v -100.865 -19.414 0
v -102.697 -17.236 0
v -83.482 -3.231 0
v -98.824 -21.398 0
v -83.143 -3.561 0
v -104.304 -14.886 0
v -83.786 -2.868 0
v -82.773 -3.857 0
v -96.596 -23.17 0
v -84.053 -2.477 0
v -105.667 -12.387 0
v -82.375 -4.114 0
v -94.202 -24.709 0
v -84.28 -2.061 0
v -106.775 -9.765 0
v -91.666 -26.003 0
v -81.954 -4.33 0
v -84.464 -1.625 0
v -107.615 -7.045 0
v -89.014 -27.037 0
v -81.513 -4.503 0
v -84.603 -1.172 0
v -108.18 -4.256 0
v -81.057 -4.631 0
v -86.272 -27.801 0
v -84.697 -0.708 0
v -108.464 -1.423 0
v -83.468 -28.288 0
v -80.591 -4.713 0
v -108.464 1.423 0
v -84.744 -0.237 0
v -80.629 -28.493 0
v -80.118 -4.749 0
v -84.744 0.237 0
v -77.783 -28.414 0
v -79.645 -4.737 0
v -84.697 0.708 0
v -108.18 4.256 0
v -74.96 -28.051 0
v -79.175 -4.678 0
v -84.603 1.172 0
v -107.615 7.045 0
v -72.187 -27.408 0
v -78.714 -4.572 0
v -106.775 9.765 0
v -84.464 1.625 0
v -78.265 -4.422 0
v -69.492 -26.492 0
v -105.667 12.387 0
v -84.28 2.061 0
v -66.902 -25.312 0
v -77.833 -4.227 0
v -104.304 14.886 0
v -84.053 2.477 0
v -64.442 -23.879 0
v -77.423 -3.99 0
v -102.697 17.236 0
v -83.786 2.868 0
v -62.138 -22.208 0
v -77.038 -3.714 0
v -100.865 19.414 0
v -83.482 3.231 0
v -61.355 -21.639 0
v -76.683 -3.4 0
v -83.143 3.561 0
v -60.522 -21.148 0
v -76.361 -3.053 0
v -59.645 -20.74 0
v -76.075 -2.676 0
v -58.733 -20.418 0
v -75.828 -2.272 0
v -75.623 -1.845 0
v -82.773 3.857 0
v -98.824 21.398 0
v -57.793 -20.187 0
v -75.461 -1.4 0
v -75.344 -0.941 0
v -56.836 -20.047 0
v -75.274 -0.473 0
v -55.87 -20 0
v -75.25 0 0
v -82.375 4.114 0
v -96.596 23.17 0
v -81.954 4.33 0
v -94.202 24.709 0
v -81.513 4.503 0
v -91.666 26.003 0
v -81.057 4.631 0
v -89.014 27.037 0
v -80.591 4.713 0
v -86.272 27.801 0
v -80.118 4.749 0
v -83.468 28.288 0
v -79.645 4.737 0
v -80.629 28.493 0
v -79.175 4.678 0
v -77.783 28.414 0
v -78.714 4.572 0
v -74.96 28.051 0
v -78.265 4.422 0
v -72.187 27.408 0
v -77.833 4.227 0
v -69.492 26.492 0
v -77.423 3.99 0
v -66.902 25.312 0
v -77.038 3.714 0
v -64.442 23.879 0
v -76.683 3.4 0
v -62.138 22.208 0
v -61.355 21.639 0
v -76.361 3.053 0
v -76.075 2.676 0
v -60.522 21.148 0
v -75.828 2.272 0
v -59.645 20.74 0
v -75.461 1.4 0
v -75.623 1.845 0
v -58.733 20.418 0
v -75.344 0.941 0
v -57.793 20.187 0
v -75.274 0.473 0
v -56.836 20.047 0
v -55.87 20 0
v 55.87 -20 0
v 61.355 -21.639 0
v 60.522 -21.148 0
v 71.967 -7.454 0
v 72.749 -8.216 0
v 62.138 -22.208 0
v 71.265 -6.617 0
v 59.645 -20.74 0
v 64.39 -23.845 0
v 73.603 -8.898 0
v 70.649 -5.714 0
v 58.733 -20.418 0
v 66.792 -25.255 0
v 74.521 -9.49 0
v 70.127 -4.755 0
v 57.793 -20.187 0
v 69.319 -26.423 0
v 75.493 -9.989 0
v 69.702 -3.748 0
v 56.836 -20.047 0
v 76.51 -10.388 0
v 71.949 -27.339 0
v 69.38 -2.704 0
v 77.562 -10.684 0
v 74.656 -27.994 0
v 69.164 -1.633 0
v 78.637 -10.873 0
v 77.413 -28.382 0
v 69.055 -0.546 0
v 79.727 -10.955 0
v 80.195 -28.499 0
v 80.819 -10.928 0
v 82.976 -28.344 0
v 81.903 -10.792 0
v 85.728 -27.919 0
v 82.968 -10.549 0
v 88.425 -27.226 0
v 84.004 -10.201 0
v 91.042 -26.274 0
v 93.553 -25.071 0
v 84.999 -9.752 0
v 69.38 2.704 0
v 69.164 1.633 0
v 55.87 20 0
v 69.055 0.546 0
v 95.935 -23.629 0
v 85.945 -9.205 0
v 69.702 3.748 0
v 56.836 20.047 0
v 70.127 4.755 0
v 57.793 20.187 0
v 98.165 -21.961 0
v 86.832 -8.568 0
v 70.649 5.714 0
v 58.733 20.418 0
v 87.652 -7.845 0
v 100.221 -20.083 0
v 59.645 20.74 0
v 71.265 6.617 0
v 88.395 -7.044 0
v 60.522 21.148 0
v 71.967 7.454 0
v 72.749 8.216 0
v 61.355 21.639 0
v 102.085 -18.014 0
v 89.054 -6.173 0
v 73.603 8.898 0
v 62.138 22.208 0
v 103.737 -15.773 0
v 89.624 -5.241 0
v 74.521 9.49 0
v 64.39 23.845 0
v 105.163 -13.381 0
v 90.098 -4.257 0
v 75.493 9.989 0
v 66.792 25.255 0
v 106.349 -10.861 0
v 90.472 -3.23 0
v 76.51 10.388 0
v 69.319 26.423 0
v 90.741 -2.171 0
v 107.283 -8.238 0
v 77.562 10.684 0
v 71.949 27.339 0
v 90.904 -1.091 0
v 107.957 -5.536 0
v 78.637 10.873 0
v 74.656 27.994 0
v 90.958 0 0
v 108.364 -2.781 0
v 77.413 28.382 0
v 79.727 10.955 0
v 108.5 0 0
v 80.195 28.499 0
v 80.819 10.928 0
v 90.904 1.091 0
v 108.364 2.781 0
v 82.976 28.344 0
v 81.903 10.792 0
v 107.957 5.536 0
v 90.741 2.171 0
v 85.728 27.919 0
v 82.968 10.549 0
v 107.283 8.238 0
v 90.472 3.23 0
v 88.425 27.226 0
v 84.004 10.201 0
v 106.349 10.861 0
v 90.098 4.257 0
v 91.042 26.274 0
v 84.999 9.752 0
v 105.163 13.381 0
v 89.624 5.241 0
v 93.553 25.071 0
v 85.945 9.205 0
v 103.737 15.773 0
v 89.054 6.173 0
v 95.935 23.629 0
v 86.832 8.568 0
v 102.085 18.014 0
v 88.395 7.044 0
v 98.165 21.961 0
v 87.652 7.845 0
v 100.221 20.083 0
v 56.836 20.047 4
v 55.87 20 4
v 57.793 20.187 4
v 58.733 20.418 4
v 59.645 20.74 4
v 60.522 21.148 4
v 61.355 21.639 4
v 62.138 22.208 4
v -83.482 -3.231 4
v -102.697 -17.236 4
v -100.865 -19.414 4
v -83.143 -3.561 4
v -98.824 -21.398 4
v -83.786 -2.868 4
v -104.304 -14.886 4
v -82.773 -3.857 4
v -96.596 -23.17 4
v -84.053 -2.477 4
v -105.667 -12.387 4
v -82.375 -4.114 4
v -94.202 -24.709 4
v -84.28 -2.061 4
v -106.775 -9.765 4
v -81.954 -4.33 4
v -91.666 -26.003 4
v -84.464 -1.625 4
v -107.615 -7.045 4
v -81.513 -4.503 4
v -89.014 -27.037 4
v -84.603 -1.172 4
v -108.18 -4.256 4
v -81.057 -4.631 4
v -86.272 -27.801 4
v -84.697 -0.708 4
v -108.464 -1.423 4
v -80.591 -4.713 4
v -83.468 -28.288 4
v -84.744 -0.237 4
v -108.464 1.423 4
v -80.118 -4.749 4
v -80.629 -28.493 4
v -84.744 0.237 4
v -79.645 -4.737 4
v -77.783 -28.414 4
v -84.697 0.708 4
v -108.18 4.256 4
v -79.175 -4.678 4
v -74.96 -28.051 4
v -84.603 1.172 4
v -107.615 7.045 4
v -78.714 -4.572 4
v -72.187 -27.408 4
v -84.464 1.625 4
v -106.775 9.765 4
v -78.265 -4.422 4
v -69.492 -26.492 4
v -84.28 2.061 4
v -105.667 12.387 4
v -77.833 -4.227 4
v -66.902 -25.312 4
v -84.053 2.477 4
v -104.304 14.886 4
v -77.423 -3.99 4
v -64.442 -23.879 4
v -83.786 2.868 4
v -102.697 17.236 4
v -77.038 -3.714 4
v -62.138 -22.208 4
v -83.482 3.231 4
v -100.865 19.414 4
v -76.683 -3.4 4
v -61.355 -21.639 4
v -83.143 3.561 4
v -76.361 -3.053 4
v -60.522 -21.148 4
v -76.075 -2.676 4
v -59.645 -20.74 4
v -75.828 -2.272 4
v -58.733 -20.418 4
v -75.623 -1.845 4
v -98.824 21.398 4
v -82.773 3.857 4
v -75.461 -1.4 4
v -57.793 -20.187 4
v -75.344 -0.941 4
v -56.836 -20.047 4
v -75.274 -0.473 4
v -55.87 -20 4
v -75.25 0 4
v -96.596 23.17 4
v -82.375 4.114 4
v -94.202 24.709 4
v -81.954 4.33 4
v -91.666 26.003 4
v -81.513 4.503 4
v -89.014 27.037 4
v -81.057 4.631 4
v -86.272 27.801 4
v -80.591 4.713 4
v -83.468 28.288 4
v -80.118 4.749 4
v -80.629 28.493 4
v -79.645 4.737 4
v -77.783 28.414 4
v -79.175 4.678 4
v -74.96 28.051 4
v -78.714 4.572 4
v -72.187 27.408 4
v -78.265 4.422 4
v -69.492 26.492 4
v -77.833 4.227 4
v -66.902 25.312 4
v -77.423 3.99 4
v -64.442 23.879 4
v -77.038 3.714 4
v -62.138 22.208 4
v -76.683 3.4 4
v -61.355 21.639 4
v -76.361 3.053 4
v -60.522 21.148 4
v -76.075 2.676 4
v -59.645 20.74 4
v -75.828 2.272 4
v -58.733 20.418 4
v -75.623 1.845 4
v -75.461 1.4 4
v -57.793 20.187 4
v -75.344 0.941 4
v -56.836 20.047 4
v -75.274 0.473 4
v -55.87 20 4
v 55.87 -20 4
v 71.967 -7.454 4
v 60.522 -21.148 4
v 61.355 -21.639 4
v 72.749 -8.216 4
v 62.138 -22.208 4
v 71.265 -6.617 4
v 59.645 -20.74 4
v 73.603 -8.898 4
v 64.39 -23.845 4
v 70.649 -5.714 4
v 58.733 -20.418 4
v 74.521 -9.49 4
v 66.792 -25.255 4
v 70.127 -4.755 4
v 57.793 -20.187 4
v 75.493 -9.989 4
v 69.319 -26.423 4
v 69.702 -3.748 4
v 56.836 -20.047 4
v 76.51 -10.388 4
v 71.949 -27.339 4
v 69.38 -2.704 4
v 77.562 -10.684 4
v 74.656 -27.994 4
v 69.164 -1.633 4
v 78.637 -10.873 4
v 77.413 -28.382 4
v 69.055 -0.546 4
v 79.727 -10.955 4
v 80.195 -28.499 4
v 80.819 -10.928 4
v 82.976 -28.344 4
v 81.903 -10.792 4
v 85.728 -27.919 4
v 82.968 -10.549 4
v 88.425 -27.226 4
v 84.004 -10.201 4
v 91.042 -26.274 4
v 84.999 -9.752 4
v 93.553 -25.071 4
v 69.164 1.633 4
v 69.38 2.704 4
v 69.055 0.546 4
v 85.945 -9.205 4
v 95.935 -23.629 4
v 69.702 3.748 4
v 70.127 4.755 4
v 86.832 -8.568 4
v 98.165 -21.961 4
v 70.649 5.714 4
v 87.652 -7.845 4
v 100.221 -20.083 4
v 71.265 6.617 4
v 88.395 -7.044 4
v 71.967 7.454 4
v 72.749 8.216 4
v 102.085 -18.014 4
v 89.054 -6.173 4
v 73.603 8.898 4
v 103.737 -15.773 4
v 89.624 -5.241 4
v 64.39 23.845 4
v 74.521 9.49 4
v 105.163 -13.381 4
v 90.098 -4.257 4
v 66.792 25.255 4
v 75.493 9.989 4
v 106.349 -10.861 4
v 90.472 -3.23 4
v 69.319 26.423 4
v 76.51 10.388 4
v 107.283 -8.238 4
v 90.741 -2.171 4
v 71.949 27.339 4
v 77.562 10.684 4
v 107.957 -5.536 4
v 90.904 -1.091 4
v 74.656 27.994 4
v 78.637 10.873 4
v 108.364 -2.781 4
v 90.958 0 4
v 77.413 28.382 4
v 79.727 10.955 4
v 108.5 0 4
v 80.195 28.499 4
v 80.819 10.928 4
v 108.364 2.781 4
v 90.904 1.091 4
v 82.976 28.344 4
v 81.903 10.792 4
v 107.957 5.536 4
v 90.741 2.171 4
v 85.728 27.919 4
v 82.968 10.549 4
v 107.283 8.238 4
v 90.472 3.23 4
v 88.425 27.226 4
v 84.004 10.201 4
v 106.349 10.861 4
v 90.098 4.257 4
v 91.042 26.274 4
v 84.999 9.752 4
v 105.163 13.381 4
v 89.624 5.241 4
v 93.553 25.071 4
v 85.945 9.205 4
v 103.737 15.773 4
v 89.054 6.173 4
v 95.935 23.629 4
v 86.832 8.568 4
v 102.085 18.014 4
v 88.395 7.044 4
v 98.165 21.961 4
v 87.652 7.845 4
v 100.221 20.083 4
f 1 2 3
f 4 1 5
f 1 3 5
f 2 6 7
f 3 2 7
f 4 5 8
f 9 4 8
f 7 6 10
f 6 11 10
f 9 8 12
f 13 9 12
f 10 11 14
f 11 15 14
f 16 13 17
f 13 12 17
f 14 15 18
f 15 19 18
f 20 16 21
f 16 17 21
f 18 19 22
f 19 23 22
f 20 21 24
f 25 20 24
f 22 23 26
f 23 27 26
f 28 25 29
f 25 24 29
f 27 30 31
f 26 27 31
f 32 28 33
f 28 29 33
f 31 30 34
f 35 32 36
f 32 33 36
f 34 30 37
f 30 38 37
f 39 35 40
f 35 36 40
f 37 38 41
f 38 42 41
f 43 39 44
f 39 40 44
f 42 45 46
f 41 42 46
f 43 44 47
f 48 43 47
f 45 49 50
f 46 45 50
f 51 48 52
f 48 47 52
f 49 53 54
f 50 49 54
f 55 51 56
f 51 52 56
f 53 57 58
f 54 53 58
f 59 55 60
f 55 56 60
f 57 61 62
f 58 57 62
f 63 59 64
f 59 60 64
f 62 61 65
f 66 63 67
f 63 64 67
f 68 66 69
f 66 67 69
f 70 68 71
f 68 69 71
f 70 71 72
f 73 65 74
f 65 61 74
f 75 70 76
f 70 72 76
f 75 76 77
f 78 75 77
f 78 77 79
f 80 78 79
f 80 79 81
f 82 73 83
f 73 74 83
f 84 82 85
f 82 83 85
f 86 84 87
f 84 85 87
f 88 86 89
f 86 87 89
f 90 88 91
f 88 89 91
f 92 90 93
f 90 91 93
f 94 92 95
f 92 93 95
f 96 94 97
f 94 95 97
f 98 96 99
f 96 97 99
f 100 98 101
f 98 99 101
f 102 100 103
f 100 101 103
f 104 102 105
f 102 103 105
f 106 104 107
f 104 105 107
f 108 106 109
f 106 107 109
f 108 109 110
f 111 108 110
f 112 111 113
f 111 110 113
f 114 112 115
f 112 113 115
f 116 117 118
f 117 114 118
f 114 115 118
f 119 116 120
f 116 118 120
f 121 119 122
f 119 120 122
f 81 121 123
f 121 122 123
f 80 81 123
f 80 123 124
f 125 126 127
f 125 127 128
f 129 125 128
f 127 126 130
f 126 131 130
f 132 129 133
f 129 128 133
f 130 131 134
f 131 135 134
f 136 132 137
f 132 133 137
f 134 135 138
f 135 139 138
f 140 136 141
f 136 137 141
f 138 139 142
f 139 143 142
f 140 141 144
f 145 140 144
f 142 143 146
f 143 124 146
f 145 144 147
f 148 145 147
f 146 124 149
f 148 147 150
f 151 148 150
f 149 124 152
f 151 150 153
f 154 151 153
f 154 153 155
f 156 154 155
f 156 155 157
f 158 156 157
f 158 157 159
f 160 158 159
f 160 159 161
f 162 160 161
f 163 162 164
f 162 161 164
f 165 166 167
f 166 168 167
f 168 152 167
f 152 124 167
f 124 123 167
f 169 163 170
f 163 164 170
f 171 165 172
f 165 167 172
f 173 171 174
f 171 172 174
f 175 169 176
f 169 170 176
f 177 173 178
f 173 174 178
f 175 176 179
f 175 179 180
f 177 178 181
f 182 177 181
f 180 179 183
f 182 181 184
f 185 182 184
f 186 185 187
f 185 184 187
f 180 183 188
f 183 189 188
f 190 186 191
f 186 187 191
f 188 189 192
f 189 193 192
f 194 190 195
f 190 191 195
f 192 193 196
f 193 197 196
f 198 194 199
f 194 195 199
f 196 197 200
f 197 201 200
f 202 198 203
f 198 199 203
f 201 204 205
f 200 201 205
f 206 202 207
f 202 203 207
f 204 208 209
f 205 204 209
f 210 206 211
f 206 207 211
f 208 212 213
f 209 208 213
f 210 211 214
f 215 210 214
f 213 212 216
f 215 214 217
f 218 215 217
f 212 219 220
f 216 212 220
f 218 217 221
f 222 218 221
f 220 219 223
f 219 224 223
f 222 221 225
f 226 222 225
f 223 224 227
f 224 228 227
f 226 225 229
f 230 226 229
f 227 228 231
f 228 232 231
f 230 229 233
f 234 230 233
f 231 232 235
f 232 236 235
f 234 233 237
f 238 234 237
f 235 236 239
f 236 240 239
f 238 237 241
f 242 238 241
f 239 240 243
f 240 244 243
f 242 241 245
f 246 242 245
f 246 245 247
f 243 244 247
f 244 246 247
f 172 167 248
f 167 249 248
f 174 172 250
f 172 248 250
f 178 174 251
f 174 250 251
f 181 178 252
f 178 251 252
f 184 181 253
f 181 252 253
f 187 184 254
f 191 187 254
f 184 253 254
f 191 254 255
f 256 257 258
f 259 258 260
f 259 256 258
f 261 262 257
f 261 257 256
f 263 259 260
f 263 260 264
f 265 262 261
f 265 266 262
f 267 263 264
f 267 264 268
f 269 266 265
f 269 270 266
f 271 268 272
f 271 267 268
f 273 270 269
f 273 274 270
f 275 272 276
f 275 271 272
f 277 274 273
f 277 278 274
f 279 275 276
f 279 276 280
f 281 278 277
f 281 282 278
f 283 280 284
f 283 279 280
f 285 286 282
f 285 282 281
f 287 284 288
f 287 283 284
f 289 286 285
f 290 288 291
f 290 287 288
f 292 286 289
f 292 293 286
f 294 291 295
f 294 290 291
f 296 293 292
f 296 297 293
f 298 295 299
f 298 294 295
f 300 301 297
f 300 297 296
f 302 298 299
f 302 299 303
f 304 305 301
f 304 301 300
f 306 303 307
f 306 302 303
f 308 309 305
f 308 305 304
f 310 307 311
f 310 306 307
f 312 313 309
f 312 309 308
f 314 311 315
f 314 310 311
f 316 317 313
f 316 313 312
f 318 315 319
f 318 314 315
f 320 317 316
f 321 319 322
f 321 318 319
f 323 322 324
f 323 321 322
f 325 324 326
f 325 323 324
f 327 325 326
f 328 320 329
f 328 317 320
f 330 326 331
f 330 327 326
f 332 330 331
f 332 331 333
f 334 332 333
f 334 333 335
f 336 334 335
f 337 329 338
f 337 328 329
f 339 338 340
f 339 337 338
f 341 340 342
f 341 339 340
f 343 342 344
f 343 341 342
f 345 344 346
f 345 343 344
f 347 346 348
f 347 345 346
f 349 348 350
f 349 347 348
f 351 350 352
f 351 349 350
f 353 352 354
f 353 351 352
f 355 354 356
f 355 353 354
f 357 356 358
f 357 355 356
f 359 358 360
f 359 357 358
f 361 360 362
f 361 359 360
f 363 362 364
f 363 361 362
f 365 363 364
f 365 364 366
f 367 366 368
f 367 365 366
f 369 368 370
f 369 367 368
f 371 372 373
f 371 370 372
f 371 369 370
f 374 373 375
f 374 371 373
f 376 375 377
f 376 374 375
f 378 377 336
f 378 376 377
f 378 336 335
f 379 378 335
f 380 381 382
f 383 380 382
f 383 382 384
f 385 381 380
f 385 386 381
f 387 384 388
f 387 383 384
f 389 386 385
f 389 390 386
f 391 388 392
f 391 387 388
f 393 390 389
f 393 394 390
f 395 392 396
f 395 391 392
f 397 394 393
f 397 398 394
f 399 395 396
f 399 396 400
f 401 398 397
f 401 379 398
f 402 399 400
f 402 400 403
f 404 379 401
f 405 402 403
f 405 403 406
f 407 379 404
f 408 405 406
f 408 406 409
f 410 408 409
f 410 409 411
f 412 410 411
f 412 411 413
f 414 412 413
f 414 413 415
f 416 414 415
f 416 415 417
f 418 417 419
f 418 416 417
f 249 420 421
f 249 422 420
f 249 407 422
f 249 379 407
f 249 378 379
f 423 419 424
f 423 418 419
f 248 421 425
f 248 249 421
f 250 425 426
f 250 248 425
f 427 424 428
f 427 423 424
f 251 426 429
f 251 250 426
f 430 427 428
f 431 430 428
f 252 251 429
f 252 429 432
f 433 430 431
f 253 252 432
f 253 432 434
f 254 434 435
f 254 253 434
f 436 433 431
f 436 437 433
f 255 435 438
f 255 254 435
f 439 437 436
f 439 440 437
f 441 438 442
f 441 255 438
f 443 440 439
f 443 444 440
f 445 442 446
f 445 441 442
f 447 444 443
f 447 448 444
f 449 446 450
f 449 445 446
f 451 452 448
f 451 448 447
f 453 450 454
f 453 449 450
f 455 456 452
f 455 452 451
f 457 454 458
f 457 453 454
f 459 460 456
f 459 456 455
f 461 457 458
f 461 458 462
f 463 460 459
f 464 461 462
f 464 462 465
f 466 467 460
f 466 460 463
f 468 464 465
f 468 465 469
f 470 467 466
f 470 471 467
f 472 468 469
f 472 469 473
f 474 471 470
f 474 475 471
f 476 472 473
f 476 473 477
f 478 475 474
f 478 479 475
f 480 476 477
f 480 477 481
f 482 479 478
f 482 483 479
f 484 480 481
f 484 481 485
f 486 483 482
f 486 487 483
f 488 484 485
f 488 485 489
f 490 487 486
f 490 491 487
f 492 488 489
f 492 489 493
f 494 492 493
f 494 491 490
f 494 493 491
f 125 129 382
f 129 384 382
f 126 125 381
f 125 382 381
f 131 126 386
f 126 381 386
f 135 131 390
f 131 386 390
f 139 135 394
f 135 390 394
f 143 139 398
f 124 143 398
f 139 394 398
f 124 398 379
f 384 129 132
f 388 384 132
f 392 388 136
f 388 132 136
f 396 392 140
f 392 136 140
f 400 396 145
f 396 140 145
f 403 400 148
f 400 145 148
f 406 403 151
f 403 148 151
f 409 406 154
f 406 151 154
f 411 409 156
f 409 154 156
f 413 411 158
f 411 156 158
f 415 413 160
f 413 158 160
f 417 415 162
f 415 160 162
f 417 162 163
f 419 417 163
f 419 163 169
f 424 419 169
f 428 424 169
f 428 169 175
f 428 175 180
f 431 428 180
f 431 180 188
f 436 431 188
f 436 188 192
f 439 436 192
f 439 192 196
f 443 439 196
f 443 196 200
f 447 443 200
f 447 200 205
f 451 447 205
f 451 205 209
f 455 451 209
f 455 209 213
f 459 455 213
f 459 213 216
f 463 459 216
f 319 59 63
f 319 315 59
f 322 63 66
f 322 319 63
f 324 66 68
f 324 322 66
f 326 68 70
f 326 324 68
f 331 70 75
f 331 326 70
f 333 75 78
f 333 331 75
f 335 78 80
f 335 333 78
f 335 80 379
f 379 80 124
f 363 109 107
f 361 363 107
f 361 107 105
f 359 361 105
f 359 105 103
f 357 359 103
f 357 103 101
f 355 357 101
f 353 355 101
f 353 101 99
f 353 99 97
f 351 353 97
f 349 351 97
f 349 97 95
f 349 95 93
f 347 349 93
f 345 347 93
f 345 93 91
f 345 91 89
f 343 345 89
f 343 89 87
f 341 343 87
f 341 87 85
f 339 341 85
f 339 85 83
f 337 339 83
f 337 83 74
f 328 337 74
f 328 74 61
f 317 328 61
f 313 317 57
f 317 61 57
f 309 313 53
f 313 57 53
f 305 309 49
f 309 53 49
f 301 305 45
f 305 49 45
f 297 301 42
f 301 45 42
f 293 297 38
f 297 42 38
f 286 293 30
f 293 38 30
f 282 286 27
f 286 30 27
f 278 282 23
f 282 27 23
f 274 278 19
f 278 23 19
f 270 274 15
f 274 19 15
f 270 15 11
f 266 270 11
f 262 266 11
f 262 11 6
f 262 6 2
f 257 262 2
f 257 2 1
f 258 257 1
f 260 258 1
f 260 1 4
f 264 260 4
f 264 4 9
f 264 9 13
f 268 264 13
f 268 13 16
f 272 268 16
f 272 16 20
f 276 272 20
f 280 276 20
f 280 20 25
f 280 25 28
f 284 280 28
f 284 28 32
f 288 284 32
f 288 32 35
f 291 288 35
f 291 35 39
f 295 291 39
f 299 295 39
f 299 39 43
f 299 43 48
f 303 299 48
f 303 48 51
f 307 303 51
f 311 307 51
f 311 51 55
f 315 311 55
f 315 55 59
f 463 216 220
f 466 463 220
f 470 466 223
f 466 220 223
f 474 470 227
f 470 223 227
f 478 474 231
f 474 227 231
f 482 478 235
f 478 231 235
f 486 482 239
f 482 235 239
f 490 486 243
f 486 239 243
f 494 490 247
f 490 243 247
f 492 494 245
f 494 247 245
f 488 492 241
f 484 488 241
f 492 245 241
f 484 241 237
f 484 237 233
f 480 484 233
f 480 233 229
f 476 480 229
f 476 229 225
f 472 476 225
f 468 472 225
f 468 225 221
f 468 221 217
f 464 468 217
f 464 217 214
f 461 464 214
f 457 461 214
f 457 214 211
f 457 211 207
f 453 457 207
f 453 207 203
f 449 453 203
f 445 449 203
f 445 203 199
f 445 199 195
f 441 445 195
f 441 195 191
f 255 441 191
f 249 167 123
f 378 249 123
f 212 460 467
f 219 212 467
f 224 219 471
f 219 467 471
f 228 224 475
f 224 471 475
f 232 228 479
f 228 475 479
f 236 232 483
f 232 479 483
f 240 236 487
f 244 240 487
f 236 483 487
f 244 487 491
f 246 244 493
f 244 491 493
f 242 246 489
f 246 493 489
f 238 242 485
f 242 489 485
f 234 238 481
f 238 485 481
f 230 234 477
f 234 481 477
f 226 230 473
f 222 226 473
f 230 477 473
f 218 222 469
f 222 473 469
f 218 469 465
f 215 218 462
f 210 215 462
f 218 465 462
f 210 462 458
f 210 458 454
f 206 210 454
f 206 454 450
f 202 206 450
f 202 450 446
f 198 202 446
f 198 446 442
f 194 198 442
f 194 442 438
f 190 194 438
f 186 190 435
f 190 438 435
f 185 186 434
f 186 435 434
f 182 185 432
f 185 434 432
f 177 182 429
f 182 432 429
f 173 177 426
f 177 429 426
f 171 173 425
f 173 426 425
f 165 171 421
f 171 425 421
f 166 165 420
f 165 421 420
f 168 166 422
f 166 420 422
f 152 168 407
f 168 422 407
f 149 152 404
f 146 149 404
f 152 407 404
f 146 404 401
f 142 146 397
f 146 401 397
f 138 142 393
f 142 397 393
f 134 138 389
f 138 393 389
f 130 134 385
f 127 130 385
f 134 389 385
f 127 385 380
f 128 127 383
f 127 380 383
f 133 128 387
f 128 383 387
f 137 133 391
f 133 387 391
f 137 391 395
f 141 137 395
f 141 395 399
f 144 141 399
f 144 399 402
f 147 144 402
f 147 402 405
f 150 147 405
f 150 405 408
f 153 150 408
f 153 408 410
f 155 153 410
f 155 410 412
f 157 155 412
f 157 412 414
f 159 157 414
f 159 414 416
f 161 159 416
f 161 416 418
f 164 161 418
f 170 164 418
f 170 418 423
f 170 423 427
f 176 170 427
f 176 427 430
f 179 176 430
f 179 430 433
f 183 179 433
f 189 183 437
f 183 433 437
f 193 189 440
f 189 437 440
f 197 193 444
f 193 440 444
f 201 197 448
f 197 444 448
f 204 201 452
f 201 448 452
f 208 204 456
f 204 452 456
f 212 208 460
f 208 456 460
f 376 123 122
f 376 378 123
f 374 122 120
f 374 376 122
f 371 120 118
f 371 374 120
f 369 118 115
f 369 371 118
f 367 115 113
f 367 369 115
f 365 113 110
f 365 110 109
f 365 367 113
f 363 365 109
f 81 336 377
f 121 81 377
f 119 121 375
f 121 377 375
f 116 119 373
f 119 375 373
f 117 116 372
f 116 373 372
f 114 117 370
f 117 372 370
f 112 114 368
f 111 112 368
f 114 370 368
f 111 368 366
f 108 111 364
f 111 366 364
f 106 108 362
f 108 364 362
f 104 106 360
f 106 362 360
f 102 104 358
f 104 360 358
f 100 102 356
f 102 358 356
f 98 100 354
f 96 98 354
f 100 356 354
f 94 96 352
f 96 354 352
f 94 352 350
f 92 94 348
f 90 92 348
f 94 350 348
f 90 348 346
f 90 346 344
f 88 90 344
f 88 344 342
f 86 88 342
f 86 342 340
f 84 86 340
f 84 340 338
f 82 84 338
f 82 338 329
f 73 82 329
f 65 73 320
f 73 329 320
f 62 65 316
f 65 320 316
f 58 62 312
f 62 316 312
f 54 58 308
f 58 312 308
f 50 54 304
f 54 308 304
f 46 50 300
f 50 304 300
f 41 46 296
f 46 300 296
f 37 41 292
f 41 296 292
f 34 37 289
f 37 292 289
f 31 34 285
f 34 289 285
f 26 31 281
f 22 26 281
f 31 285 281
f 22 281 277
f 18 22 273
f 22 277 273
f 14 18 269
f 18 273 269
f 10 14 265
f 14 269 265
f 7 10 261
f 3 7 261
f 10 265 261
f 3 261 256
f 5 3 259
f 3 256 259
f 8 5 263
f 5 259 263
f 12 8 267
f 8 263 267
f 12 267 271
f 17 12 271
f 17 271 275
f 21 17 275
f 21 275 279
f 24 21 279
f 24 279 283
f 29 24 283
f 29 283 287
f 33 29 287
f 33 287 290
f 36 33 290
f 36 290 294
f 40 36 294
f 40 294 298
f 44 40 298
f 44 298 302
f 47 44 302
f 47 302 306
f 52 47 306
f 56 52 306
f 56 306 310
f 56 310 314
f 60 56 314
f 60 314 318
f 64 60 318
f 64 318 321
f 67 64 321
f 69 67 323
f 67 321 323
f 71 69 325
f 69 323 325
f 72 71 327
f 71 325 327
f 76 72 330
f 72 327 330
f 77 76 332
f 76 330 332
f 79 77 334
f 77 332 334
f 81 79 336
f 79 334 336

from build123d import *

# Parameters (mm, degrees)
EXTRUDE_1_DEPTH     = 4
SKETCH_12_R         = 4.75
SKETCH_12_R_2       = 10.958447214
CUT_EXTRUDE_1_DEPTH = 4
FILLET_1_R          = 10


with BuildPart() as part:
    # Sketch 1 → 凸台-拉伸1 (new body)
    with BuildSketch(Plane.XY):
        with BuildLine():
            ThreePointArc((-51.5, 0), (-53.628497347, 10.807120237), (-59.696059496, 20))
            ThreePointArc((-59.696059496, 20), (-108.5, 0), (-59.696059496, -20))
            ThreePointArc((-59.696059496, -20), (-53.628497347, -10.807120237), (-51.5, 0))
        make_face()
        with BuildLine():
            ThreePointArc((59.696059496, -20), (51.5, 0), (59.696059496, 20))
            Line((59.696059496, 20), (-59.696059496, 20))
            ThreePointArc((-59.696059496, 20), (-53.628497347, 10.807120237), (-51.5, 0))
            ThreePointArc((-51.5, 0), (-53.628497347, -10.807120237), (-59.696059496, -20))
            Line((-59.696059496, -20), (59.696059496, -20))
        make_face()
        with BuildLine():
            ThreePointArc((108.5, 0), (90.807120237, 26.371502653), (59.696059496, 20))
            ThreePointArc((59.696059496, 20), (51.5, 0), (59.696059496, -20))
            ThreePointArc((59.696059496, -20), (90.807120237, -26.371502653), (108.5, 0))
        make_face()
    extrude(amount=EXTRUDE_1_DEPTH)

    # 草图12 → 切除-拉伸1 (cut)
    with BuildSketch(Plane.XY.offset(4)):
        with Locations((-80, 0)):
            Circle(SKETCH_12_R)
        with Locations((80, 0)):
            Circle(SKETCH_12_R_2)
    extrude(amount=-CUT_EXTRUDE_1_DEPTH, mode=Mode.SUBTRACT)

    # 圆角1
    fillet_1_edges = [part.edges().sort_by_distance(p)[0] for p in [
        (-59.696059496, -20, 2),
        (59.696059496, -20, 2),
        (59.696059496, 20, 2),
        (-59.696059496, 20, 2),
    ]]
    fillet(fillet_1_edges, radius=FILLET_1_R)


solid = part.part
